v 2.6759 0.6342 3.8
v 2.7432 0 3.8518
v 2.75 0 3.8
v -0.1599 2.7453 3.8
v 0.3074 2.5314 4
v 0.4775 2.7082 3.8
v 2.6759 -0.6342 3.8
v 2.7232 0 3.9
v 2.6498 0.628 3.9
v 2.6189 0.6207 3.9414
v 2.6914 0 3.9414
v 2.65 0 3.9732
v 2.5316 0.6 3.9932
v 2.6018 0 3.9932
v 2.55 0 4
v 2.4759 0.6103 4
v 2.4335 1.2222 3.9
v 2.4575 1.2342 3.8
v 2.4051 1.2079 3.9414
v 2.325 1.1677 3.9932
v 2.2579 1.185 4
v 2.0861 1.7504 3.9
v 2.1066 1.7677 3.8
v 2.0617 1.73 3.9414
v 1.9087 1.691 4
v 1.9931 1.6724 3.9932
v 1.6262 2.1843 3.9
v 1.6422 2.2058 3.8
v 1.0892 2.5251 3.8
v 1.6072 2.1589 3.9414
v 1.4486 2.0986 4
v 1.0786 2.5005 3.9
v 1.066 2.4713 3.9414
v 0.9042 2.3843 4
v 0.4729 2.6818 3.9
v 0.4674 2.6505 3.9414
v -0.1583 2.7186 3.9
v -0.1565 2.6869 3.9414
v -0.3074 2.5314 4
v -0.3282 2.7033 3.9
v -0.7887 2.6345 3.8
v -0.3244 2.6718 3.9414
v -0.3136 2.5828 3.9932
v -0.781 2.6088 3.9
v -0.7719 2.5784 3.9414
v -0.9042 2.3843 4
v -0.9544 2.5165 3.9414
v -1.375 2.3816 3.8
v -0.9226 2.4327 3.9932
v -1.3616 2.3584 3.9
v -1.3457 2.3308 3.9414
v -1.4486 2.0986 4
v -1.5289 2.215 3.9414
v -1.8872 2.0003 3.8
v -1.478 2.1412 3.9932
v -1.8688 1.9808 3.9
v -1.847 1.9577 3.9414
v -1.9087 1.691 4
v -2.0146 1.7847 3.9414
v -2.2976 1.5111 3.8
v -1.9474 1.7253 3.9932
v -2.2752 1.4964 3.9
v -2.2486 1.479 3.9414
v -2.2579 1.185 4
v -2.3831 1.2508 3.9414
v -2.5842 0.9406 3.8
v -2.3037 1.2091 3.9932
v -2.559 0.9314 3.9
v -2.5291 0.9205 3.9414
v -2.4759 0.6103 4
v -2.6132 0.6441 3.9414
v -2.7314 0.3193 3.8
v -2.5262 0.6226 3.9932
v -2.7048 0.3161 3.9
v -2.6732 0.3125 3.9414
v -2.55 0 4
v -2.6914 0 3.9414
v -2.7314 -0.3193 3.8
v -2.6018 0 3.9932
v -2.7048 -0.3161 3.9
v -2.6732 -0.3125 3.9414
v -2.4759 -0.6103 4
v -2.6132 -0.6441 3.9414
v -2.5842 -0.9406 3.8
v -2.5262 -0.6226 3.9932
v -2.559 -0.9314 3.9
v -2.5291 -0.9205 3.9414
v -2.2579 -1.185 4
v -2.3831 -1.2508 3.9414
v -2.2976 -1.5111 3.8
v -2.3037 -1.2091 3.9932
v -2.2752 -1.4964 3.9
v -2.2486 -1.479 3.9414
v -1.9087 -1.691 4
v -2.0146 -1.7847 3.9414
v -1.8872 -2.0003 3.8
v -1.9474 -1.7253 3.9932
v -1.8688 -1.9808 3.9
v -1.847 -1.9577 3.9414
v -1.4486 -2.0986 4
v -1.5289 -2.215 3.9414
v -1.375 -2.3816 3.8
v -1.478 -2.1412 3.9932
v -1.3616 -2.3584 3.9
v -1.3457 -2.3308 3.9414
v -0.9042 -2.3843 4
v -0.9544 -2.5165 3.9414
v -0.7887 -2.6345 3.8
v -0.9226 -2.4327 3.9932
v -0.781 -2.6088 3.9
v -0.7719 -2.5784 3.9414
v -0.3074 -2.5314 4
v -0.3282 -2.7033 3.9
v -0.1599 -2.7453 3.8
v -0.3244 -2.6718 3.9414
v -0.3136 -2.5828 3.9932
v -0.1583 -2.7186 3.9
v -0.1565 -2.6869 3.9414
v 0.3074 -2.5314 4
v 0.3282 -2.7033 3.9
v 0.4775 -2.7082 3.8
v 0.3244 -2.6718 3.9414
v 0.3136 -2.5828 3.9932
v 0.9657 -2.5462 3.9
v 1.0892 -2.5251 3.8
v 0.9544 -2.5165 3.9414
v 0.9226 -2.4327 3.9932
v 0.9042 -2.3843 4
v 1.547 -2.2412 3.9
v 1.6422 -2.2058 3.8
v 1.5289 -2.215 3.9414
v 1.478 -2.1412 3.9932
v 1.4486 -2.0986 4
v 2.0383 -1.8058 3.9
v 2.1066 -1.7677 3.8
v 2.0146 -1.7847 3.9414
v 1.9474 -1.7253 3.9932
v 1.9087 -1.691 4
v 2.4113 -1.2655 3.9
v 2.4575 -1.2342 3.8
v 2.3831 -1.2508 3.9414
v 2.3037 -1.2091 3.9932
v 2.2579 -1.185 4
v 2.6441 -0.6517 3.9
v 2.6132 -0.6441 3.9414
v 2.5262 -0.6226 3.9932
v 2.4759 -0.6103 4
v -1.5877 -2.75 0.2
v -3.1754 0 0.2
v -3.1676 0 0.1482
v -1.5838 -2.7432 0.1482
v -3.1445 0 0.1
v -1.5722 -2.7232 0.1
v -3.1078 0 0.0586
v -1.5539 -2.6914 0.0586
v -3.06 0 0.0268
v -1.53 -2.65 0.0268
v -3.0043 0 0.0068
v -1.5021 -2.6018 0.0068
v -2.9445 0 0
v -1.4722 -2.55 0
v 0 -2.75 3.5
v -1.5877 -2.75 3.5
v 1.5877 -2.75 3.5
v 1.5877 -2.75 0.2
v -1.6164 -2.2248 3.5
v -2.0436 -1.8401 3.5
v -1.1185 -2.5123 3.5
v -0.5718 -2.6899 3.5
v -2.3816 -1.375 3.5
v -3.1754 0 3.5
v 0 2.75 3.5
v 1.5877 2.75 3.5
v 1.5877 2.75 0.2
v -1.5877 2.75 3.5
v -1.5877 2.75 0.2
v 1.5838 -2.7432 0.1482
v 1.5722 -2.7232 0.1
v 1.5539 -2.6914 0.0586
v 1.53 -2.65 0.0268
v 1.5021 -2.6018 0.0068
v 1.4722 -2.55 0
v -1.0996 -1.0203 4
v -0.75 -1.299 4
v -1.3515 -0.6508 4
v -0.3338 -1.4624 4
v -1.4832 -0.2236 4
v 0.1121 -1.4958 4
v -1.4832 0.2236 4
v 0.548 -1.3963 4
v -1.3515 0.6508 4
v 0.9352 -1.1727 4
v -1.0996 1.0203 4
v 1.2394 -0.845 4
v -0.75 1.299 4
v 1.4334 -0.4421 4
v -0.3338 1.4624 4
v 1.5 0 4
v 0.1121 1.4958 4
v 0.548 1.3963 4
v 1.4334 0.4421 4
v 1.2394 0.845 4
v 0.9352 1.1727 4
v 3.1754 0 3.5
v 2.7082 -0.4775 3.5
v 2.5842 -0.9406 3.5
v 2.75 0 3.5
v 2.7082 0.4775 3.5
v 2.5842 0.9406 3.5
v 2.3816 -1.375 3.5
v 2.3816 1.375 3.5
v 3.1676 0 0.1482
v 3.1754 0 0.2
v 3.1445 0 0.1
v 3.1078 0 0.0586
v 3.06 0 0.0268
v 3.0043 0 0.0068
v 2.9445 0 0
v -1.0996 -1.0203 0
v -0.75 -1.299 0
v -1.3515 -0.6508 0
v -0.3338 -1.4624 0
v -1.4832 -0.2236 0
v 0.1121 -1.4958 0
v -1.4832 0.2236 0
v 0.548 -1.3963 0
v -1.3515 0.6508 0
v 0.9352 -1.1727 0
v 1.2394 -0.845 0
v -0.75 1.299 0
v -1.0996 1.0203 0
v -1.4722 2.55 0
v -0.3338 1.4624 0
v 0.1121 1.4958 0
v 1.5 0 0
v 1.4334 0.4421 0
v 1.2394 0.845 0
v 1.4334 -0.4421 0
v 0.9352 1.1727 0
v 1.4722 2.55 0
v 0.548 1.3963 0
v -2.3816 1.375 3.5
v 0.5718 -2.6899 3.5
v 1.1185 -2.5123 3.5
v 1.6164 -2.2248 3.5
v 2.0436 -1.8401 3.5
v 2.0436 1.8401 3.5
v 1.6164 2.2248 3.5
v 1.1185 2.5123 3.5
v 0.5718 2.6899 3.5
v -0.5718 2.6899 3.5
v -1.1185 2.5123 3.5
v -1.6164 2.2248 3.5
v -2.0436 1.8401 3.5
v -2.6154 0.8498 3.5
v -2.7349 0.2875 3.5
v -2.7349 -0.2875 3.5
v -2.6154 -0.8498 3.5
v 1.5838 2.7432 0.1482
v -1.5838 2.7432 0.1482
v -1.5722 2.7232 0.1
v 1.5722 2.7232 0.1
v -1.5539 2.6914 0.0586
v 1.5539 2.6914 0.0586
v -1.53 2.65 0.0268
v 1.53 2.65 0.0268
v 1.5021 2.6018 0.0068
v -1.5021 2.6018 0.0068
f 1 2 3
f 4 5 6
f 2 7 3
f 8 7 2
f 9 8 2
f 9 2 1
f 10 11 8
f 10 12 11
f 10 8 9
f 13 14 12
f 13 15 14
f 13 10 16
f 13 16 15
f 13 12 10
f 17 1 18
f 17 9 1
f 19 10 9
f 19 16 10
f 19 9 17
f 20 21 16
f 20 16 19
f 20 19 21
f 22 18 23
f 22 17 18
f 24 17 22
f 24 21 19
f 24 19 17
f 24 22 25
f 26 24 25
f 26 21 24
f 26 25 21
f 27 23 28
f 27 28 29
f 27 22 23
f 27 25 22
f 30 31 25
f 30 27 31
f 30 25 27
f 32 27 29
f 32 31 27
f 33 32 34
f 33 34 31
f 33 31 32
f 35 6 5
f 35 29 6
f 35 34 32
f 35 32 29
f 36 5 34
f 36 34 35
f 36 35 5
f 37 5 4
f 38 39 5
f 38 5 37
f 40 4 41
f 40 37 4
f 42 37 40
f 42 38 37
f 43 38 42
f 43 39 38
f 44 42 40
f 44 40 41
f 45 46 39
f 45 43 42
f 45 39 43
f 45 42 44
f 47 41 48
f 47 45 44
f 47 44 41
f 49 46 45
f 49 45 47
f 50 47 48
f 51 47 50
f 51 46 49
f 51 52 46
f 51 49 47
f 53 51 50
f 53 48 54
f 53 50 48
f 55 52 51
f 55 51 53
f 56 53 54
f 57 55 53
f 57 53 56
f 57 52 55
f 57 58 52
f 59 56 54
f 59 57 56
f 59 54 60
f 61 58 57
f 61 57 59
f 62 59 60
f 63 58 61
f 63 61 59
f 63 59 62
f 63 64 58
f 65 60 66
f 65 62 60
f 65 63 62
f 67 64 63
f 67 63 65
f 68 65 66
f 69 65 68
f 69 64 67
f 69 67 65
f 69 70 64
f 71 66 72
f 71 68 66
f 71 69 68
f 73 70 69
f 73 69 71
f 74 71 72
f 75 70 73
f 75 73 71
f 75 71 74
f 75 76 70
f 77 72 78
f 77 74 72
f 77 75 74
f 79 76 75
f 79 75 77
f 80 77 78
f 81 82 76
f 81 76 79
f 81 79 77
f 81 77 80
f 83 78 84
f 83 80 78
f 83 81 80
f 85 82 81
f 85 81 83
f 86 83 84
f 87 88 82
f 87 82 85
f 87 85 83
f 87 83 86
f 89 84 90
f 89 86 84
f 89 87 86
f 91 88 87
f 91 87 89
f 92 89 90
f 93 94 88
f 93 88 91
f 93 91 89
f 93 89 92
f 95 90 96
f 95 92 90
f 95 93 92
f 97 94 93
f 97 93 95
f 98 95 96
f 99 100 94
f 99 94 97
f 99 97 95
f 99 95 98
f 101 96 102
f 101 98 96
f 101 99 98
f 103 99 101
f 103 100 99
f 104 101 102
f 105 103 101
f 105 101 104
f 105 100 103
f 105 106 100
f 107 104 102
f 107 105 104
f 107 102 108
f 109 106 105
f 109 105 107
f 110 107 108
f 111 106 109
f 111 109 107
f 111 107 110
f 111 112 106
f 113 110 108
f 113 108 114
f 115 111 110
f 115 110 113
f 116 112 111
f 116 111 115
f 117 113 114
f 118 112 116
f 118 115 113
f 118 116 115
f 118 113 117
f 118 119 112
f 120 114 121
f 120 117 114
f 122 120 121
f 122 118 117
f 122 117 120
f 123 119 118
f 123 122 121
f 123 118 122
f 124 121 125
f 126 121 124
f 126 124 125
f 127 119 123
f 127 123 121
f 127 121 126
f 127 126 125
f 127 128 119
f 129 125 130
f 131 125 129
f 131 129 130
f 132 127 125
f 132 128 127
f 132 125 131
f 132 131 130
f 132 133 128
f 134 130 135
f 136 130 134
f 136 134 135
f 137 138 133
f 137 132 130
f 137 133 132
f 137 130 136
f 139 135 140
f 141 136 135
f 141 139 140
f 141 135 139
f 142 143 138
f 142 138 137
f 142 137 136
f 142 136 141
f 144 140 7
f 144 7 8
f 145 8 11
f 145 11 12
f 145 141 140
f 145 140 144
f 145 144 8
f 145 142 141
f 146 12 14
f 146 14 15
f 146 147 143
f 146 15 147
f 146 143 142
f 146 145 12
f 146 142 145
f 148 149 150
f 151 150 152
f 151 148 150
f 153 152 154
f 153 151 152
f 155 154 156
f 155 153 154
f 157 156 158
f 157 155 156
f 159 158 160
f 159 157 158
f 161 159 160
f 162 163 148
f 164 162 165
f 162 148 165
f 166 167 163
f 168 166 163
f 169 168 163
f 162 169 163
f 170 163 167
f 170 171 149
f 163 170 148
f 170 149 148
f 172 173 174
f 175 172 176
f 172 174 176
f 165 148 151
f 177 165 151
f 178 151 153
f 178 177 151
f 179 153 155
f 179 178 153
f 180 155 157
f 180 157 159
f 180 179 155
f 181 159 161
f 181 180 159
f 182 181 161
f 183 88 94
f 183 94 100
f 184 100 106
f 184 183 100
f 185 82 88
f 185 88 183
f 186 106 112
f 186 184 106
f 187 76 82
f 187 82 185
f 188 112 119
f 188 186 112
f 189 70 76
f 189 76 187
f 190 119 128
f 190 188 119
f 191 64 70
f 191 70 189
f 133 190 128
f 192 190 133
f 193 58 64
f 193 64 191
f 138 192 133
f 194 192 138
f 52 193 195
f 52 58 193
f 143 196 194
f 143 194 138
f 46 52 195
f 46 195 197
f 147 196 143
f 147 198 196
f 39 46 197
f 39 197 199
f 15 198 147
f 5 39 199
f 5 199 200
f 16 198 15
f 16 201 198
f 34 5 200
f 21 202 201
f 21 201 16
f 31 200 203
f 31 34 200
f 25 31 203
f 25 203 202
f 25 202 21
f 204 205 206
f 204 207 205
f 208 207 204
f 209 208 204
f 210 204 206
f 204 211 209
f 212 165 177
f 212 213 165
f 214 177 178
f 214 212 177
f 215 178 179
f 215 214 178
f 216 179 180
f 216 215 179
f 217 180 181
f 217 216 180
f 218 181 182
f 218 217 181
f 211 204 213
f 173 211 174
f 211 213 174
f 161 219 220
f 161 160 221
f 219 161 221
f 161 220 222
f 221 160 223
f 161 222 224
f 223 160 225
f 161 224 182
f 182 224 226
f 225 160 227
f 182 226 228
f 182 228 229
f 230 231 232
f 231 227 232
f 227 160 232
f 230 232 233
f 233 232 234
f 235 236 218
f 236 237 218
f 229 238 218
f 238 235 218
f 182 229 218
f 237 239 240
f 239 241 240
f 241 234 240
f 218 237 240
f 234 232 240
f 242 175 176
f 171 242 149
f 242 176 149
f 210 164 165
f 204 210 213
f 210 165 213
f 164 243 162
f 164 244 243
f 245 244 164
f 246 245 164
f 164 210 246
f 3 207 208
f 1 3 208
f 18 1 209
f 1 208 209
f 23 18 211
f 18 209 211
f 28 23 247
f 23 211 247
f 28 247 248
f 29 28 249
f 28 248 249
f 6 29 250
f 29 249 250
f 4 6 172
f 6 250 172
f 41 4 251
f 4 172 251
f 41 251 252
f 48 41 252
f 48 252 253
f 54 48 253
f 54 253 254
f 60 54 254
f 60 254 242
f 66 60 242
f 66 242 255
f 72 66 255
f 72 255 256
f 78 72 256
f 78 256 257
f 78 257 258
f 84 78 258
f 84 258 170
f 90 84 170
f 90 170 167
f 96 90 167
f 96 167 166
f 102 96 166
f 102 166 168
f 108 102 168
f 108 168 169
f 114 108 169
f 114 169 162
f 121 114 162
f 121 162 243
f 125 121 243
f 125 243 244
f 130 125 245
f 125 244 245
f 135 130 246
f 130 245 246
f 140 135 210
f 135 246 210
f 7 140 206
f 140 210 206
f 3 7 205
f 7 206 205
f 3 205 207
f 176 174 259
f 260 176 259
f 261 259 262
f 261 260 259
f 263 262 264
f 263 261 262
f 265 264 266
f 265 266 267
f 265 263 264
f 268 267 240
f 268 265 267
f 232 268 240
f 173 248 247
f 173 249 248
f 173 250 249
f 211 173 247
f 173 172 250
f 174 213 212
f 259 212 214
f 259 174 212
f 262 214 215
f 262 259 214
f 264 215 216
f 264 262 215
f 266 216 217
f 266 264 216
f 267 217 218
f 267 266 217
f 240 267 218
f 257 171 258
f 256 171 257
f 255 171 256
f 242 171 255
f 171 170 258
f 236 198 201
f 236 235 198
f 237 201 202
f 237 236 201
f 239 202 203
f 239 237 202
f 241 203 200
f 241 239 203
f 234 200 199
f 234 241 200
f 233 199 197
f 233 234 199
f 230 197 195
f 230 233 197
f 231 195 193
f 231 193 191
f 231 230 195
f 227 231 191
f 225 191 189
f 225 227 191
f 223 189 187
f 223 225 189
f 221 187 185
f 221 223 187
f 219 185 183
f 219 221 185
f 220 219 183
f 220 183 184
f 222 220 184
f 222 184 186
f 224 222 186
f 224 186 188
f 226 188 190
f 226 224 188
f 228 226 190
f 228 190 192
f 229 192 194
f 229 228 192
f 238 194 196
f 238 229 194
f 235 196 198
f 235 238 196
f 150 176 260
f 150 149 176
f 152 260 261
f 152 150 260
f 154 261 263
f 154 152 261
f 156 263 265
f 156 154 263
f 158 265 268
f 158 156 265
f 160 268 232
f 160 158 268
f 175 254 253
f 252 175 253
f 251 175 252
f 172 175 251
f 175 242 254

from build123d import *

# Parameters (mm, degrees)
SKETCH_1_R      = 1.5
EXTRUDE_1_DEPTH = 3.5
SKETCH_2_R      = 2.75
SKETCH_2_R_2    = 1.5
EXTRUDE_2_DEPTH = 0.5
FILLET_4_R      = 0.2
FILLET_5_R      = 0.2


with BuildPart() as part:
    # 草图1 → 凸台-拉伸1 (new body)
    with BuildSketch(Plane.XY):
        Polygon((3.175426481, 0), (1.58771324, 2.75), (-1.58771324, 2.75), (-3.175426481, 0), (-1.58771324, -2.75), (1.58771324, -2.75), align=None)
        Circle(SKETCH_1_R, mode=Mode.SUBTRACT)
    extrude(amount=EXTRUDE_1_DEPTH)

    # 草图2 → 凸台-拉伸2 (add)
    with BuildSketch(Plane.XY.offset(3.5)):
        Circle(SKETCH_2_R)
        Circle(SKETCH_2_R_2, mode=Mode.SUBTRACT)
    extrude(amount=EXTRUDE_2_DEPTH)

    # 圆角4
    fillet_4_edges = [part.edges().sort_by_distance(p)[0] for p in [
        (-2.75, 0, 4),
    ]]
    fillet(fillet_4_edges, radius=FILLET_4_R)

    # 圆角5
    fillet_5_edges = [part.edges().sort_by_distance(p)[0] for p in [
        (0, -2.75, 0),
        (-2.38156986, -1.375, 0),
        (-2.38156986, 1.375, 0),
        (0, 2.75, 0),
        (2.38156986, 1.375, 0),
        (2.38156986, -1.375, 0),
    ]]
    fillet(fillet_5_edges, radius=FILLET_5_R)


solid = part.part
